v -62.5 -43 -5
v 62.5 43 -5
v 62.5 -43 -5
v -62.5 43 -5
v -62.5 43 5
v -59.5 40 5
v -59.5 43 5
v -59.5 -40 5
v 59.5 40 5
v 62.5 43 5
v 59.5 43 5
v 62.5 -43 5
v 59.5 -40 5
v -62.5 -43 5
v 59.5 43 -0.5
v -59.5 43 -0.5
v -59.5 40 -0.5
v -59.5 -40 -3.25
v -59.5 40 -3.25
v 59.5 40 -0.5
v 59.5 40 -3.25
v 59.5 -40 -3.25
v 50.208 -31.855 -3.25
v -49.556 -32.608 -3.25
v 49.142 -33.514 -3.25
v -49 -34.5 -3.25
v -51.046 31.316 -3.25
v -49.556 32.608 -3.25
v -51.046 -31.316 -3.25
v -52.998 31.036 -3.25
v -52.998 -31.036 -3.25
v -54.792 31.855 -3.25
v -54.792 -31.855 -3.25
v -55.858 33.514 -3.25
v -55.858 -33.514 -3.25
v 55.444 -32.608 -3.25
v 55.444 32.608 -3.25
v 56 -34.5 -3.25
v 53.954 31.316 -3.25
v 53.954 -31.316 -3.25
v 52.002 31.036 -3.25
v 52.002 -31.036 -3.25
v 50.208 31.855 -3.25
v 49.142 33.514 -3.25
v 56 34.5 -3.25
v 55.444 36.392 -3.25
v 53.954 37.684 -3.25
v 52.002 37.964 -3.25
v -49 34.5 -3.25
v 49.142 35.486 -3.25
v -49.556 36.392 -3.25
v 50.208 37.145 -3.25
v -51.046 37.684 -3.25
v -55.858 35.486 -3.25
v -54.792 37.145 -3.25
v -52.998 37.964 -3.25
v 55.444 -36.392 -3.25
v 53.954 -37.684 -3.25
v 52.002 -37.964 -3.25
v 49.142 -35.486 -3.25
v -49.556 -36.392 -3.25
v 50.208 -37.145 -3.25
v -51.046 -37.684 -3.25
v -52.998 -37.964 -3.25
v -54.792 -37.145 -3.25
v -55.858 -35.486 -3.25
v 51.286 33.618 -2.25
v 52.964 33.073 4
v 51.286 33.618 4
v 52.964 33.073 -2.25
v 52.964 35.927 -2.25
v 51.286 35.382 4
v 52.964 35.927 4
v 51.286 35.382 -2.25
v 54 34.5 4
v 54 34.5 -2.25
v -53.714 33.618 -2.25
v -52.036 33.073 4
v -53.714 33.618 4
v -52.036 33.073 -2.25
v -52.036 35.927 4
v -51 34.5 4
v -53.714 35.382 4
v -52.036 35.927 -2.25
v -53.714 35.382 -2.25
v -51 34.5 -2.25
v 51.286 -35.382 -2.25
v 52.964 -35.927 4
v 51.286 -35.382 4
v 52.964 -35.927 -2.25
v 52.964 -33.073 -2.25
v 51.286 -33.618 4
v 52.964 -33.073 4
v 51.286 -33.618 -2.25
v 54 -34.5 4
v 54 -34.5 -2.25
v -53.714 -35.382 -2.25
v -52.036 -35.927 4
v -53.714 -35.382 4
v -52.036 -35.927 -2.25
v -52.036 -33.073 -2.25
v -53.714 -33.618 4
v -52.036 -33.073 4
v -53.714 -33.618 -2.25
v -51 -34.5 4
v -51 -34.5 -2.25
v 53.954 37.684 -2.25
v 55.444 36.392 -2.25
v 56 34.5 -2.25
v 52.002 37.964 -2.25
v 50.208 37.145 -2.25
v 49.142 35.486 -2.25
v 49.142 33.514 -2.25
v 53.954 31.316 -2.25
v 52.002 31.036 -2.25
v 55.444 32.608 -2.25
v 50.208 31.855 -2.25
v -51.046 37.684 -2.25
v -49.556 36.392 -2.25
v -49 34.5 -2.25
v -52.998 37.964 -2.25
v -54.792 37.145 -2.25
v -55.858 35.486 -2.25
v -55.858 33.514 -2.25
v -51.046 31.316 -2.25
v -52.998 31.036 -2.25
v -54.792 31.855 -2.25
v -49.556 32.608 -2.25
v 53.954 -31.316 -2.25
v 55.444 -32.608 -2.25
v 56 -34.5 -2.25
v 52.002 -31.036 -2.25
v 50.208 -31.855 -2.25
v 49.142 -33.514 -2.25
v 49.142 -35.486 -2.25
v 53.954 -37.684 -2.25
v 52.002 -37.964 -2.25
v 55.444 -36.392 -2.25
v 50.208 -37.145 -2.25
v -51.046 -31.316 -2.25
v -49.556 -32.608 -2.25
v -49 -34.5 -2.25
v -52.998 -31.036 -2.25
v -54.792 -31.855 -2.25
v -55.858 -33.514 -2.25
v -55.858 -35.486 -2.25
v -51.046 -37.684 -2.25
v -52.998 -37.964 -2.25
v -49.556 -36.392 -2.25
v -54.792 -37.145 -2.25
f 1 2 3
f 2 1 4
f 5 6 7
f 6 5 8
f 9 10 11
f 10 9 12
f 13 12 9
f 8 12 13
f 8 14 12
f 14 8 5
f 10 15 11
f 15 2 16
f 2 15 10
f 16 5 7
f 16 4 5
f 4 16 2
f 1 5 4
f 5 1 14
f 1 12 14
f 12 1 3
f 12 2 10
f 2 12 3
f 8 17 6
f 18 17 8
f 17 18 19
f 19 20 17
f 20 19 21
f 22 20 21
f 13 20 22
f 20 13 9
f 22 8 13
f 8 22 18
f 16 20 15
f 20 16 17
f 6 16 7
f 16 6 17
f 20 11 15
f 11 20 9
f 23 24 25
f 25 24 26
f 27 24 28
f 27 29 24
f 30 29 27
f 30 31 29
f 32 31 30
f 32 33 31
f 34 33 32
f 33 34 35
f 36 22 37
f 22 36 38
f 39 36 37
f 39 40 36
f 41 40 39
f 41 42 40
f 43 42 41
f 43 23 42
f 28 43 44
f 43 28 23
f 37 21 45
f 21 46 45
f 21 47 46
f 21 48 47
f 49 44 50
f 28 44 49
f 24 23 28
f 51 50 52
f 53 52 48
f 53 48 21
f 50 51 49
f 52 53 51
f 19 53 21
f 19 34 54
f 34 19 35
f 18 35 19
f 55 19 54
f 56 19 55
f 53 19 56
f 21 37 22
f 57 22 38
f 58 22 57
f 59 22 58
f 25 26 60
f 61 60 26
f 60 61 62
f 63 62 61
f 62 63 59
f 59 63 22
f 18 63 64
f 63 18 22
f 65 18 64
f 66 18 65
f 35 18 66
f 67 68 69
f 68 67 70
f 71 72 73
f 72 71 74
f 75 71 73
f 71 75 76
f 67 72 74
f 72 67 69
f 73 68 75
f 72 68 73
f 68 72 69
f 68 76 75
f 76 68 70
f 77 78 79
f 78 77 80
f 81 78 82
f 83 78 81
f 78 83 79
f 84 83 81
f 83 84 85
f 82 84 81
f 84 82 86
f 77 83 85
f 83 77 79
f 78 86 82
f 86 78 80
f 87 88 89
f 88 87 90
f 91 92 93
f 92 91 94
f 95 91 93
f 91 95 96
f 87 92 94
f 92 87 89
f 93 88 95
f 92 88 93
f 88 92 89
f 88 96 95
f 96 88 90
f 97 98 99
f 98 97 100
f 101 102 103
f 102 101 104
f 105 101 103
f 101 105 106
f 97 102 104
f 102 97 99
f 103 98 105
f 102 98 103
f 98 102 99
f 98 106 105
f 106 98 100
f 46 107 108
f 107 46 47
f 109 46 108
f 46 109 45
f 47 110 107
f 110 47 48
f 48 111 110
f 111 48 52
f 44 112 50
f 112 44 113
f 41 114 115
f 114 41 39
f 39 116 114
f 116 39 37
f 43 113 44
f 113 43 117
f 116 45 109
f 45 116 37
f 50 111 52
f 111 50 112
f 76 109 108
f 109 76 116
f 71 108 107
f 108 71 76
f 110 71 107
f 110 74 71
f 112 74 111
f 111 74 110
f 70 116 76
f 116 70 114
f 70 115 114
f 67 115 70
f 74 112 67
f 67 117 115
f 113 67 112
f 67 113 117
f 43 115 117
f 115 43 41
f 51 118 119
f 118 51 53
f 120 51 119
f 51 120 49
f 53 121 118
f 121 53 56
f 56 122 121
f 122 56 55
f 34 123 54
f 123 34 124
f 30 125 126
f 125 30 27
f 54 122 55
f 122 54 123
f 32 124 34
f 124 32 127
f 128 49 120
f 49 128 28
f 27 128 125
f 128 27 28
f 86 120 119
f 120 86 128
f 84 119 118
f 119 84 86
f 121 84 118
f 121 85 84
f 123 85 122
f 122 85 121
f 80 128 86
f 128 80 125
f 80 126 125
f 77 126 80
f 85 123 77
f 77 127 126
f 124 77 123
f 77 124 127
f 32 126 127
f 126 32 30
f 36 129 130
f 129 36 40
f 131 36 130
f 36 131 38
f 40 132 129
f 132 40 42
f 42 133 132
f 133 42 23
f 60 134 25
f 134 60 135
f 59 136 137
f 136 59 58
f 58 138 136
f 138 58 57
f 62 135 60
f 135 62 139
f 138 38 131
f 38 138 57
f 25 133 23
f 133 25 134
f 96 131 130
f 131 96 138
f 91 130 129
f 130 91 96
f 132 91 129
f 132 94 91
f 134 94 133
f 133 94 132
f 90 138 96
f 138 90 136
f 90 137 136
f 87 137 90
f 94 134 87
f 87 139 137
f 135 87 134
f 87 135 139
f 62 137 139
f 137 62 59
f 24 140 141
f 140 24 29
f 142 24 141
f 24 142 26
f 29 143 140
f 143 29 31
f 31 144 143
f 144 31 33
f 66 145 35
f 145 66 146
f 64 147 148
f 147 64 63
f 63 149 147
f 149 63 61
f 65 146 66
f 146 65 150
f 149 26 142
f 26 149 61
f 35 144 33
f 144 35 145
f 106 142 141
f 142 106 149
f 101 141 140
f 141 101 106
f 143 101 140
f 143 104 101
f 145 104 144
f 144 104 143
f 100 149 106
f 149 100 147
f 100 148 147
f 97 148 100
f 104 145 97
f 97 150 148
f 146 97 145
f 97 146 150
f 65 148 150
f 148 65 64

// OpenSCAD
echo(version=version());

color("red")
    difference() {
        linear_extrude(height = 10, center = true)
                difference() {
                    square([125, 86], center = true);
                    square([119, 80], center = true);
                }
        translate([0,42,-0.5]) linear_extrude(height = (10 - 1.75)) square([119, 4], center = true);
    }

            
color("blue")
    translate([0,0,-5]) {
        linear_extrude(height = 1.75)
            difference() {
                square([125, 86], center = true);
            }
        }


    color("magenta") translate([(61 - 5.5 - 3), (41 - 3.5 - 3), 0]) cylinder( h = 8, r = 1.5, center = true );
    color("SteelBlue") translate([(-61 + 5.5 + 3), (41 - 3.5 - 3), 0]) cylinder( h = 8, r = 1.5, center = true );
    color("OrangeRed") translate([(61 - 5.5 - 3), -(41 - 3.5 - 3), 0]) cylinder( h = 8, r = 1.5, center = true );
    color("green") translate([-(61 - 5.5 - 3), -(41 - 3.5 - 3), 0]) cylinder( h = 8, r = 1.5, center = true );


    color("black") translate([(61 - 5.5 - 3), (41 - 3.5 - 3), -3]) cylinder( h = 1.5, r = 3.5, center = true );
    color("black") translate([(-61 + 5.5 + 3), (41 - 3.5 - 3), -3]) cylinder( h = 1.5, r = 3.5, center = true );
    color("black") translate([(61 - 5.5 - 3), -(41 - 3.5 - 3), -3]) cylinder( h = 1.5, r = 3.5, center = true );
    color("black") translate([-(61 - 5.5 - 3), -(41 - 3.5 - 3), -3]) cylinder( h = 1.5, r = 3.5, center = true );
